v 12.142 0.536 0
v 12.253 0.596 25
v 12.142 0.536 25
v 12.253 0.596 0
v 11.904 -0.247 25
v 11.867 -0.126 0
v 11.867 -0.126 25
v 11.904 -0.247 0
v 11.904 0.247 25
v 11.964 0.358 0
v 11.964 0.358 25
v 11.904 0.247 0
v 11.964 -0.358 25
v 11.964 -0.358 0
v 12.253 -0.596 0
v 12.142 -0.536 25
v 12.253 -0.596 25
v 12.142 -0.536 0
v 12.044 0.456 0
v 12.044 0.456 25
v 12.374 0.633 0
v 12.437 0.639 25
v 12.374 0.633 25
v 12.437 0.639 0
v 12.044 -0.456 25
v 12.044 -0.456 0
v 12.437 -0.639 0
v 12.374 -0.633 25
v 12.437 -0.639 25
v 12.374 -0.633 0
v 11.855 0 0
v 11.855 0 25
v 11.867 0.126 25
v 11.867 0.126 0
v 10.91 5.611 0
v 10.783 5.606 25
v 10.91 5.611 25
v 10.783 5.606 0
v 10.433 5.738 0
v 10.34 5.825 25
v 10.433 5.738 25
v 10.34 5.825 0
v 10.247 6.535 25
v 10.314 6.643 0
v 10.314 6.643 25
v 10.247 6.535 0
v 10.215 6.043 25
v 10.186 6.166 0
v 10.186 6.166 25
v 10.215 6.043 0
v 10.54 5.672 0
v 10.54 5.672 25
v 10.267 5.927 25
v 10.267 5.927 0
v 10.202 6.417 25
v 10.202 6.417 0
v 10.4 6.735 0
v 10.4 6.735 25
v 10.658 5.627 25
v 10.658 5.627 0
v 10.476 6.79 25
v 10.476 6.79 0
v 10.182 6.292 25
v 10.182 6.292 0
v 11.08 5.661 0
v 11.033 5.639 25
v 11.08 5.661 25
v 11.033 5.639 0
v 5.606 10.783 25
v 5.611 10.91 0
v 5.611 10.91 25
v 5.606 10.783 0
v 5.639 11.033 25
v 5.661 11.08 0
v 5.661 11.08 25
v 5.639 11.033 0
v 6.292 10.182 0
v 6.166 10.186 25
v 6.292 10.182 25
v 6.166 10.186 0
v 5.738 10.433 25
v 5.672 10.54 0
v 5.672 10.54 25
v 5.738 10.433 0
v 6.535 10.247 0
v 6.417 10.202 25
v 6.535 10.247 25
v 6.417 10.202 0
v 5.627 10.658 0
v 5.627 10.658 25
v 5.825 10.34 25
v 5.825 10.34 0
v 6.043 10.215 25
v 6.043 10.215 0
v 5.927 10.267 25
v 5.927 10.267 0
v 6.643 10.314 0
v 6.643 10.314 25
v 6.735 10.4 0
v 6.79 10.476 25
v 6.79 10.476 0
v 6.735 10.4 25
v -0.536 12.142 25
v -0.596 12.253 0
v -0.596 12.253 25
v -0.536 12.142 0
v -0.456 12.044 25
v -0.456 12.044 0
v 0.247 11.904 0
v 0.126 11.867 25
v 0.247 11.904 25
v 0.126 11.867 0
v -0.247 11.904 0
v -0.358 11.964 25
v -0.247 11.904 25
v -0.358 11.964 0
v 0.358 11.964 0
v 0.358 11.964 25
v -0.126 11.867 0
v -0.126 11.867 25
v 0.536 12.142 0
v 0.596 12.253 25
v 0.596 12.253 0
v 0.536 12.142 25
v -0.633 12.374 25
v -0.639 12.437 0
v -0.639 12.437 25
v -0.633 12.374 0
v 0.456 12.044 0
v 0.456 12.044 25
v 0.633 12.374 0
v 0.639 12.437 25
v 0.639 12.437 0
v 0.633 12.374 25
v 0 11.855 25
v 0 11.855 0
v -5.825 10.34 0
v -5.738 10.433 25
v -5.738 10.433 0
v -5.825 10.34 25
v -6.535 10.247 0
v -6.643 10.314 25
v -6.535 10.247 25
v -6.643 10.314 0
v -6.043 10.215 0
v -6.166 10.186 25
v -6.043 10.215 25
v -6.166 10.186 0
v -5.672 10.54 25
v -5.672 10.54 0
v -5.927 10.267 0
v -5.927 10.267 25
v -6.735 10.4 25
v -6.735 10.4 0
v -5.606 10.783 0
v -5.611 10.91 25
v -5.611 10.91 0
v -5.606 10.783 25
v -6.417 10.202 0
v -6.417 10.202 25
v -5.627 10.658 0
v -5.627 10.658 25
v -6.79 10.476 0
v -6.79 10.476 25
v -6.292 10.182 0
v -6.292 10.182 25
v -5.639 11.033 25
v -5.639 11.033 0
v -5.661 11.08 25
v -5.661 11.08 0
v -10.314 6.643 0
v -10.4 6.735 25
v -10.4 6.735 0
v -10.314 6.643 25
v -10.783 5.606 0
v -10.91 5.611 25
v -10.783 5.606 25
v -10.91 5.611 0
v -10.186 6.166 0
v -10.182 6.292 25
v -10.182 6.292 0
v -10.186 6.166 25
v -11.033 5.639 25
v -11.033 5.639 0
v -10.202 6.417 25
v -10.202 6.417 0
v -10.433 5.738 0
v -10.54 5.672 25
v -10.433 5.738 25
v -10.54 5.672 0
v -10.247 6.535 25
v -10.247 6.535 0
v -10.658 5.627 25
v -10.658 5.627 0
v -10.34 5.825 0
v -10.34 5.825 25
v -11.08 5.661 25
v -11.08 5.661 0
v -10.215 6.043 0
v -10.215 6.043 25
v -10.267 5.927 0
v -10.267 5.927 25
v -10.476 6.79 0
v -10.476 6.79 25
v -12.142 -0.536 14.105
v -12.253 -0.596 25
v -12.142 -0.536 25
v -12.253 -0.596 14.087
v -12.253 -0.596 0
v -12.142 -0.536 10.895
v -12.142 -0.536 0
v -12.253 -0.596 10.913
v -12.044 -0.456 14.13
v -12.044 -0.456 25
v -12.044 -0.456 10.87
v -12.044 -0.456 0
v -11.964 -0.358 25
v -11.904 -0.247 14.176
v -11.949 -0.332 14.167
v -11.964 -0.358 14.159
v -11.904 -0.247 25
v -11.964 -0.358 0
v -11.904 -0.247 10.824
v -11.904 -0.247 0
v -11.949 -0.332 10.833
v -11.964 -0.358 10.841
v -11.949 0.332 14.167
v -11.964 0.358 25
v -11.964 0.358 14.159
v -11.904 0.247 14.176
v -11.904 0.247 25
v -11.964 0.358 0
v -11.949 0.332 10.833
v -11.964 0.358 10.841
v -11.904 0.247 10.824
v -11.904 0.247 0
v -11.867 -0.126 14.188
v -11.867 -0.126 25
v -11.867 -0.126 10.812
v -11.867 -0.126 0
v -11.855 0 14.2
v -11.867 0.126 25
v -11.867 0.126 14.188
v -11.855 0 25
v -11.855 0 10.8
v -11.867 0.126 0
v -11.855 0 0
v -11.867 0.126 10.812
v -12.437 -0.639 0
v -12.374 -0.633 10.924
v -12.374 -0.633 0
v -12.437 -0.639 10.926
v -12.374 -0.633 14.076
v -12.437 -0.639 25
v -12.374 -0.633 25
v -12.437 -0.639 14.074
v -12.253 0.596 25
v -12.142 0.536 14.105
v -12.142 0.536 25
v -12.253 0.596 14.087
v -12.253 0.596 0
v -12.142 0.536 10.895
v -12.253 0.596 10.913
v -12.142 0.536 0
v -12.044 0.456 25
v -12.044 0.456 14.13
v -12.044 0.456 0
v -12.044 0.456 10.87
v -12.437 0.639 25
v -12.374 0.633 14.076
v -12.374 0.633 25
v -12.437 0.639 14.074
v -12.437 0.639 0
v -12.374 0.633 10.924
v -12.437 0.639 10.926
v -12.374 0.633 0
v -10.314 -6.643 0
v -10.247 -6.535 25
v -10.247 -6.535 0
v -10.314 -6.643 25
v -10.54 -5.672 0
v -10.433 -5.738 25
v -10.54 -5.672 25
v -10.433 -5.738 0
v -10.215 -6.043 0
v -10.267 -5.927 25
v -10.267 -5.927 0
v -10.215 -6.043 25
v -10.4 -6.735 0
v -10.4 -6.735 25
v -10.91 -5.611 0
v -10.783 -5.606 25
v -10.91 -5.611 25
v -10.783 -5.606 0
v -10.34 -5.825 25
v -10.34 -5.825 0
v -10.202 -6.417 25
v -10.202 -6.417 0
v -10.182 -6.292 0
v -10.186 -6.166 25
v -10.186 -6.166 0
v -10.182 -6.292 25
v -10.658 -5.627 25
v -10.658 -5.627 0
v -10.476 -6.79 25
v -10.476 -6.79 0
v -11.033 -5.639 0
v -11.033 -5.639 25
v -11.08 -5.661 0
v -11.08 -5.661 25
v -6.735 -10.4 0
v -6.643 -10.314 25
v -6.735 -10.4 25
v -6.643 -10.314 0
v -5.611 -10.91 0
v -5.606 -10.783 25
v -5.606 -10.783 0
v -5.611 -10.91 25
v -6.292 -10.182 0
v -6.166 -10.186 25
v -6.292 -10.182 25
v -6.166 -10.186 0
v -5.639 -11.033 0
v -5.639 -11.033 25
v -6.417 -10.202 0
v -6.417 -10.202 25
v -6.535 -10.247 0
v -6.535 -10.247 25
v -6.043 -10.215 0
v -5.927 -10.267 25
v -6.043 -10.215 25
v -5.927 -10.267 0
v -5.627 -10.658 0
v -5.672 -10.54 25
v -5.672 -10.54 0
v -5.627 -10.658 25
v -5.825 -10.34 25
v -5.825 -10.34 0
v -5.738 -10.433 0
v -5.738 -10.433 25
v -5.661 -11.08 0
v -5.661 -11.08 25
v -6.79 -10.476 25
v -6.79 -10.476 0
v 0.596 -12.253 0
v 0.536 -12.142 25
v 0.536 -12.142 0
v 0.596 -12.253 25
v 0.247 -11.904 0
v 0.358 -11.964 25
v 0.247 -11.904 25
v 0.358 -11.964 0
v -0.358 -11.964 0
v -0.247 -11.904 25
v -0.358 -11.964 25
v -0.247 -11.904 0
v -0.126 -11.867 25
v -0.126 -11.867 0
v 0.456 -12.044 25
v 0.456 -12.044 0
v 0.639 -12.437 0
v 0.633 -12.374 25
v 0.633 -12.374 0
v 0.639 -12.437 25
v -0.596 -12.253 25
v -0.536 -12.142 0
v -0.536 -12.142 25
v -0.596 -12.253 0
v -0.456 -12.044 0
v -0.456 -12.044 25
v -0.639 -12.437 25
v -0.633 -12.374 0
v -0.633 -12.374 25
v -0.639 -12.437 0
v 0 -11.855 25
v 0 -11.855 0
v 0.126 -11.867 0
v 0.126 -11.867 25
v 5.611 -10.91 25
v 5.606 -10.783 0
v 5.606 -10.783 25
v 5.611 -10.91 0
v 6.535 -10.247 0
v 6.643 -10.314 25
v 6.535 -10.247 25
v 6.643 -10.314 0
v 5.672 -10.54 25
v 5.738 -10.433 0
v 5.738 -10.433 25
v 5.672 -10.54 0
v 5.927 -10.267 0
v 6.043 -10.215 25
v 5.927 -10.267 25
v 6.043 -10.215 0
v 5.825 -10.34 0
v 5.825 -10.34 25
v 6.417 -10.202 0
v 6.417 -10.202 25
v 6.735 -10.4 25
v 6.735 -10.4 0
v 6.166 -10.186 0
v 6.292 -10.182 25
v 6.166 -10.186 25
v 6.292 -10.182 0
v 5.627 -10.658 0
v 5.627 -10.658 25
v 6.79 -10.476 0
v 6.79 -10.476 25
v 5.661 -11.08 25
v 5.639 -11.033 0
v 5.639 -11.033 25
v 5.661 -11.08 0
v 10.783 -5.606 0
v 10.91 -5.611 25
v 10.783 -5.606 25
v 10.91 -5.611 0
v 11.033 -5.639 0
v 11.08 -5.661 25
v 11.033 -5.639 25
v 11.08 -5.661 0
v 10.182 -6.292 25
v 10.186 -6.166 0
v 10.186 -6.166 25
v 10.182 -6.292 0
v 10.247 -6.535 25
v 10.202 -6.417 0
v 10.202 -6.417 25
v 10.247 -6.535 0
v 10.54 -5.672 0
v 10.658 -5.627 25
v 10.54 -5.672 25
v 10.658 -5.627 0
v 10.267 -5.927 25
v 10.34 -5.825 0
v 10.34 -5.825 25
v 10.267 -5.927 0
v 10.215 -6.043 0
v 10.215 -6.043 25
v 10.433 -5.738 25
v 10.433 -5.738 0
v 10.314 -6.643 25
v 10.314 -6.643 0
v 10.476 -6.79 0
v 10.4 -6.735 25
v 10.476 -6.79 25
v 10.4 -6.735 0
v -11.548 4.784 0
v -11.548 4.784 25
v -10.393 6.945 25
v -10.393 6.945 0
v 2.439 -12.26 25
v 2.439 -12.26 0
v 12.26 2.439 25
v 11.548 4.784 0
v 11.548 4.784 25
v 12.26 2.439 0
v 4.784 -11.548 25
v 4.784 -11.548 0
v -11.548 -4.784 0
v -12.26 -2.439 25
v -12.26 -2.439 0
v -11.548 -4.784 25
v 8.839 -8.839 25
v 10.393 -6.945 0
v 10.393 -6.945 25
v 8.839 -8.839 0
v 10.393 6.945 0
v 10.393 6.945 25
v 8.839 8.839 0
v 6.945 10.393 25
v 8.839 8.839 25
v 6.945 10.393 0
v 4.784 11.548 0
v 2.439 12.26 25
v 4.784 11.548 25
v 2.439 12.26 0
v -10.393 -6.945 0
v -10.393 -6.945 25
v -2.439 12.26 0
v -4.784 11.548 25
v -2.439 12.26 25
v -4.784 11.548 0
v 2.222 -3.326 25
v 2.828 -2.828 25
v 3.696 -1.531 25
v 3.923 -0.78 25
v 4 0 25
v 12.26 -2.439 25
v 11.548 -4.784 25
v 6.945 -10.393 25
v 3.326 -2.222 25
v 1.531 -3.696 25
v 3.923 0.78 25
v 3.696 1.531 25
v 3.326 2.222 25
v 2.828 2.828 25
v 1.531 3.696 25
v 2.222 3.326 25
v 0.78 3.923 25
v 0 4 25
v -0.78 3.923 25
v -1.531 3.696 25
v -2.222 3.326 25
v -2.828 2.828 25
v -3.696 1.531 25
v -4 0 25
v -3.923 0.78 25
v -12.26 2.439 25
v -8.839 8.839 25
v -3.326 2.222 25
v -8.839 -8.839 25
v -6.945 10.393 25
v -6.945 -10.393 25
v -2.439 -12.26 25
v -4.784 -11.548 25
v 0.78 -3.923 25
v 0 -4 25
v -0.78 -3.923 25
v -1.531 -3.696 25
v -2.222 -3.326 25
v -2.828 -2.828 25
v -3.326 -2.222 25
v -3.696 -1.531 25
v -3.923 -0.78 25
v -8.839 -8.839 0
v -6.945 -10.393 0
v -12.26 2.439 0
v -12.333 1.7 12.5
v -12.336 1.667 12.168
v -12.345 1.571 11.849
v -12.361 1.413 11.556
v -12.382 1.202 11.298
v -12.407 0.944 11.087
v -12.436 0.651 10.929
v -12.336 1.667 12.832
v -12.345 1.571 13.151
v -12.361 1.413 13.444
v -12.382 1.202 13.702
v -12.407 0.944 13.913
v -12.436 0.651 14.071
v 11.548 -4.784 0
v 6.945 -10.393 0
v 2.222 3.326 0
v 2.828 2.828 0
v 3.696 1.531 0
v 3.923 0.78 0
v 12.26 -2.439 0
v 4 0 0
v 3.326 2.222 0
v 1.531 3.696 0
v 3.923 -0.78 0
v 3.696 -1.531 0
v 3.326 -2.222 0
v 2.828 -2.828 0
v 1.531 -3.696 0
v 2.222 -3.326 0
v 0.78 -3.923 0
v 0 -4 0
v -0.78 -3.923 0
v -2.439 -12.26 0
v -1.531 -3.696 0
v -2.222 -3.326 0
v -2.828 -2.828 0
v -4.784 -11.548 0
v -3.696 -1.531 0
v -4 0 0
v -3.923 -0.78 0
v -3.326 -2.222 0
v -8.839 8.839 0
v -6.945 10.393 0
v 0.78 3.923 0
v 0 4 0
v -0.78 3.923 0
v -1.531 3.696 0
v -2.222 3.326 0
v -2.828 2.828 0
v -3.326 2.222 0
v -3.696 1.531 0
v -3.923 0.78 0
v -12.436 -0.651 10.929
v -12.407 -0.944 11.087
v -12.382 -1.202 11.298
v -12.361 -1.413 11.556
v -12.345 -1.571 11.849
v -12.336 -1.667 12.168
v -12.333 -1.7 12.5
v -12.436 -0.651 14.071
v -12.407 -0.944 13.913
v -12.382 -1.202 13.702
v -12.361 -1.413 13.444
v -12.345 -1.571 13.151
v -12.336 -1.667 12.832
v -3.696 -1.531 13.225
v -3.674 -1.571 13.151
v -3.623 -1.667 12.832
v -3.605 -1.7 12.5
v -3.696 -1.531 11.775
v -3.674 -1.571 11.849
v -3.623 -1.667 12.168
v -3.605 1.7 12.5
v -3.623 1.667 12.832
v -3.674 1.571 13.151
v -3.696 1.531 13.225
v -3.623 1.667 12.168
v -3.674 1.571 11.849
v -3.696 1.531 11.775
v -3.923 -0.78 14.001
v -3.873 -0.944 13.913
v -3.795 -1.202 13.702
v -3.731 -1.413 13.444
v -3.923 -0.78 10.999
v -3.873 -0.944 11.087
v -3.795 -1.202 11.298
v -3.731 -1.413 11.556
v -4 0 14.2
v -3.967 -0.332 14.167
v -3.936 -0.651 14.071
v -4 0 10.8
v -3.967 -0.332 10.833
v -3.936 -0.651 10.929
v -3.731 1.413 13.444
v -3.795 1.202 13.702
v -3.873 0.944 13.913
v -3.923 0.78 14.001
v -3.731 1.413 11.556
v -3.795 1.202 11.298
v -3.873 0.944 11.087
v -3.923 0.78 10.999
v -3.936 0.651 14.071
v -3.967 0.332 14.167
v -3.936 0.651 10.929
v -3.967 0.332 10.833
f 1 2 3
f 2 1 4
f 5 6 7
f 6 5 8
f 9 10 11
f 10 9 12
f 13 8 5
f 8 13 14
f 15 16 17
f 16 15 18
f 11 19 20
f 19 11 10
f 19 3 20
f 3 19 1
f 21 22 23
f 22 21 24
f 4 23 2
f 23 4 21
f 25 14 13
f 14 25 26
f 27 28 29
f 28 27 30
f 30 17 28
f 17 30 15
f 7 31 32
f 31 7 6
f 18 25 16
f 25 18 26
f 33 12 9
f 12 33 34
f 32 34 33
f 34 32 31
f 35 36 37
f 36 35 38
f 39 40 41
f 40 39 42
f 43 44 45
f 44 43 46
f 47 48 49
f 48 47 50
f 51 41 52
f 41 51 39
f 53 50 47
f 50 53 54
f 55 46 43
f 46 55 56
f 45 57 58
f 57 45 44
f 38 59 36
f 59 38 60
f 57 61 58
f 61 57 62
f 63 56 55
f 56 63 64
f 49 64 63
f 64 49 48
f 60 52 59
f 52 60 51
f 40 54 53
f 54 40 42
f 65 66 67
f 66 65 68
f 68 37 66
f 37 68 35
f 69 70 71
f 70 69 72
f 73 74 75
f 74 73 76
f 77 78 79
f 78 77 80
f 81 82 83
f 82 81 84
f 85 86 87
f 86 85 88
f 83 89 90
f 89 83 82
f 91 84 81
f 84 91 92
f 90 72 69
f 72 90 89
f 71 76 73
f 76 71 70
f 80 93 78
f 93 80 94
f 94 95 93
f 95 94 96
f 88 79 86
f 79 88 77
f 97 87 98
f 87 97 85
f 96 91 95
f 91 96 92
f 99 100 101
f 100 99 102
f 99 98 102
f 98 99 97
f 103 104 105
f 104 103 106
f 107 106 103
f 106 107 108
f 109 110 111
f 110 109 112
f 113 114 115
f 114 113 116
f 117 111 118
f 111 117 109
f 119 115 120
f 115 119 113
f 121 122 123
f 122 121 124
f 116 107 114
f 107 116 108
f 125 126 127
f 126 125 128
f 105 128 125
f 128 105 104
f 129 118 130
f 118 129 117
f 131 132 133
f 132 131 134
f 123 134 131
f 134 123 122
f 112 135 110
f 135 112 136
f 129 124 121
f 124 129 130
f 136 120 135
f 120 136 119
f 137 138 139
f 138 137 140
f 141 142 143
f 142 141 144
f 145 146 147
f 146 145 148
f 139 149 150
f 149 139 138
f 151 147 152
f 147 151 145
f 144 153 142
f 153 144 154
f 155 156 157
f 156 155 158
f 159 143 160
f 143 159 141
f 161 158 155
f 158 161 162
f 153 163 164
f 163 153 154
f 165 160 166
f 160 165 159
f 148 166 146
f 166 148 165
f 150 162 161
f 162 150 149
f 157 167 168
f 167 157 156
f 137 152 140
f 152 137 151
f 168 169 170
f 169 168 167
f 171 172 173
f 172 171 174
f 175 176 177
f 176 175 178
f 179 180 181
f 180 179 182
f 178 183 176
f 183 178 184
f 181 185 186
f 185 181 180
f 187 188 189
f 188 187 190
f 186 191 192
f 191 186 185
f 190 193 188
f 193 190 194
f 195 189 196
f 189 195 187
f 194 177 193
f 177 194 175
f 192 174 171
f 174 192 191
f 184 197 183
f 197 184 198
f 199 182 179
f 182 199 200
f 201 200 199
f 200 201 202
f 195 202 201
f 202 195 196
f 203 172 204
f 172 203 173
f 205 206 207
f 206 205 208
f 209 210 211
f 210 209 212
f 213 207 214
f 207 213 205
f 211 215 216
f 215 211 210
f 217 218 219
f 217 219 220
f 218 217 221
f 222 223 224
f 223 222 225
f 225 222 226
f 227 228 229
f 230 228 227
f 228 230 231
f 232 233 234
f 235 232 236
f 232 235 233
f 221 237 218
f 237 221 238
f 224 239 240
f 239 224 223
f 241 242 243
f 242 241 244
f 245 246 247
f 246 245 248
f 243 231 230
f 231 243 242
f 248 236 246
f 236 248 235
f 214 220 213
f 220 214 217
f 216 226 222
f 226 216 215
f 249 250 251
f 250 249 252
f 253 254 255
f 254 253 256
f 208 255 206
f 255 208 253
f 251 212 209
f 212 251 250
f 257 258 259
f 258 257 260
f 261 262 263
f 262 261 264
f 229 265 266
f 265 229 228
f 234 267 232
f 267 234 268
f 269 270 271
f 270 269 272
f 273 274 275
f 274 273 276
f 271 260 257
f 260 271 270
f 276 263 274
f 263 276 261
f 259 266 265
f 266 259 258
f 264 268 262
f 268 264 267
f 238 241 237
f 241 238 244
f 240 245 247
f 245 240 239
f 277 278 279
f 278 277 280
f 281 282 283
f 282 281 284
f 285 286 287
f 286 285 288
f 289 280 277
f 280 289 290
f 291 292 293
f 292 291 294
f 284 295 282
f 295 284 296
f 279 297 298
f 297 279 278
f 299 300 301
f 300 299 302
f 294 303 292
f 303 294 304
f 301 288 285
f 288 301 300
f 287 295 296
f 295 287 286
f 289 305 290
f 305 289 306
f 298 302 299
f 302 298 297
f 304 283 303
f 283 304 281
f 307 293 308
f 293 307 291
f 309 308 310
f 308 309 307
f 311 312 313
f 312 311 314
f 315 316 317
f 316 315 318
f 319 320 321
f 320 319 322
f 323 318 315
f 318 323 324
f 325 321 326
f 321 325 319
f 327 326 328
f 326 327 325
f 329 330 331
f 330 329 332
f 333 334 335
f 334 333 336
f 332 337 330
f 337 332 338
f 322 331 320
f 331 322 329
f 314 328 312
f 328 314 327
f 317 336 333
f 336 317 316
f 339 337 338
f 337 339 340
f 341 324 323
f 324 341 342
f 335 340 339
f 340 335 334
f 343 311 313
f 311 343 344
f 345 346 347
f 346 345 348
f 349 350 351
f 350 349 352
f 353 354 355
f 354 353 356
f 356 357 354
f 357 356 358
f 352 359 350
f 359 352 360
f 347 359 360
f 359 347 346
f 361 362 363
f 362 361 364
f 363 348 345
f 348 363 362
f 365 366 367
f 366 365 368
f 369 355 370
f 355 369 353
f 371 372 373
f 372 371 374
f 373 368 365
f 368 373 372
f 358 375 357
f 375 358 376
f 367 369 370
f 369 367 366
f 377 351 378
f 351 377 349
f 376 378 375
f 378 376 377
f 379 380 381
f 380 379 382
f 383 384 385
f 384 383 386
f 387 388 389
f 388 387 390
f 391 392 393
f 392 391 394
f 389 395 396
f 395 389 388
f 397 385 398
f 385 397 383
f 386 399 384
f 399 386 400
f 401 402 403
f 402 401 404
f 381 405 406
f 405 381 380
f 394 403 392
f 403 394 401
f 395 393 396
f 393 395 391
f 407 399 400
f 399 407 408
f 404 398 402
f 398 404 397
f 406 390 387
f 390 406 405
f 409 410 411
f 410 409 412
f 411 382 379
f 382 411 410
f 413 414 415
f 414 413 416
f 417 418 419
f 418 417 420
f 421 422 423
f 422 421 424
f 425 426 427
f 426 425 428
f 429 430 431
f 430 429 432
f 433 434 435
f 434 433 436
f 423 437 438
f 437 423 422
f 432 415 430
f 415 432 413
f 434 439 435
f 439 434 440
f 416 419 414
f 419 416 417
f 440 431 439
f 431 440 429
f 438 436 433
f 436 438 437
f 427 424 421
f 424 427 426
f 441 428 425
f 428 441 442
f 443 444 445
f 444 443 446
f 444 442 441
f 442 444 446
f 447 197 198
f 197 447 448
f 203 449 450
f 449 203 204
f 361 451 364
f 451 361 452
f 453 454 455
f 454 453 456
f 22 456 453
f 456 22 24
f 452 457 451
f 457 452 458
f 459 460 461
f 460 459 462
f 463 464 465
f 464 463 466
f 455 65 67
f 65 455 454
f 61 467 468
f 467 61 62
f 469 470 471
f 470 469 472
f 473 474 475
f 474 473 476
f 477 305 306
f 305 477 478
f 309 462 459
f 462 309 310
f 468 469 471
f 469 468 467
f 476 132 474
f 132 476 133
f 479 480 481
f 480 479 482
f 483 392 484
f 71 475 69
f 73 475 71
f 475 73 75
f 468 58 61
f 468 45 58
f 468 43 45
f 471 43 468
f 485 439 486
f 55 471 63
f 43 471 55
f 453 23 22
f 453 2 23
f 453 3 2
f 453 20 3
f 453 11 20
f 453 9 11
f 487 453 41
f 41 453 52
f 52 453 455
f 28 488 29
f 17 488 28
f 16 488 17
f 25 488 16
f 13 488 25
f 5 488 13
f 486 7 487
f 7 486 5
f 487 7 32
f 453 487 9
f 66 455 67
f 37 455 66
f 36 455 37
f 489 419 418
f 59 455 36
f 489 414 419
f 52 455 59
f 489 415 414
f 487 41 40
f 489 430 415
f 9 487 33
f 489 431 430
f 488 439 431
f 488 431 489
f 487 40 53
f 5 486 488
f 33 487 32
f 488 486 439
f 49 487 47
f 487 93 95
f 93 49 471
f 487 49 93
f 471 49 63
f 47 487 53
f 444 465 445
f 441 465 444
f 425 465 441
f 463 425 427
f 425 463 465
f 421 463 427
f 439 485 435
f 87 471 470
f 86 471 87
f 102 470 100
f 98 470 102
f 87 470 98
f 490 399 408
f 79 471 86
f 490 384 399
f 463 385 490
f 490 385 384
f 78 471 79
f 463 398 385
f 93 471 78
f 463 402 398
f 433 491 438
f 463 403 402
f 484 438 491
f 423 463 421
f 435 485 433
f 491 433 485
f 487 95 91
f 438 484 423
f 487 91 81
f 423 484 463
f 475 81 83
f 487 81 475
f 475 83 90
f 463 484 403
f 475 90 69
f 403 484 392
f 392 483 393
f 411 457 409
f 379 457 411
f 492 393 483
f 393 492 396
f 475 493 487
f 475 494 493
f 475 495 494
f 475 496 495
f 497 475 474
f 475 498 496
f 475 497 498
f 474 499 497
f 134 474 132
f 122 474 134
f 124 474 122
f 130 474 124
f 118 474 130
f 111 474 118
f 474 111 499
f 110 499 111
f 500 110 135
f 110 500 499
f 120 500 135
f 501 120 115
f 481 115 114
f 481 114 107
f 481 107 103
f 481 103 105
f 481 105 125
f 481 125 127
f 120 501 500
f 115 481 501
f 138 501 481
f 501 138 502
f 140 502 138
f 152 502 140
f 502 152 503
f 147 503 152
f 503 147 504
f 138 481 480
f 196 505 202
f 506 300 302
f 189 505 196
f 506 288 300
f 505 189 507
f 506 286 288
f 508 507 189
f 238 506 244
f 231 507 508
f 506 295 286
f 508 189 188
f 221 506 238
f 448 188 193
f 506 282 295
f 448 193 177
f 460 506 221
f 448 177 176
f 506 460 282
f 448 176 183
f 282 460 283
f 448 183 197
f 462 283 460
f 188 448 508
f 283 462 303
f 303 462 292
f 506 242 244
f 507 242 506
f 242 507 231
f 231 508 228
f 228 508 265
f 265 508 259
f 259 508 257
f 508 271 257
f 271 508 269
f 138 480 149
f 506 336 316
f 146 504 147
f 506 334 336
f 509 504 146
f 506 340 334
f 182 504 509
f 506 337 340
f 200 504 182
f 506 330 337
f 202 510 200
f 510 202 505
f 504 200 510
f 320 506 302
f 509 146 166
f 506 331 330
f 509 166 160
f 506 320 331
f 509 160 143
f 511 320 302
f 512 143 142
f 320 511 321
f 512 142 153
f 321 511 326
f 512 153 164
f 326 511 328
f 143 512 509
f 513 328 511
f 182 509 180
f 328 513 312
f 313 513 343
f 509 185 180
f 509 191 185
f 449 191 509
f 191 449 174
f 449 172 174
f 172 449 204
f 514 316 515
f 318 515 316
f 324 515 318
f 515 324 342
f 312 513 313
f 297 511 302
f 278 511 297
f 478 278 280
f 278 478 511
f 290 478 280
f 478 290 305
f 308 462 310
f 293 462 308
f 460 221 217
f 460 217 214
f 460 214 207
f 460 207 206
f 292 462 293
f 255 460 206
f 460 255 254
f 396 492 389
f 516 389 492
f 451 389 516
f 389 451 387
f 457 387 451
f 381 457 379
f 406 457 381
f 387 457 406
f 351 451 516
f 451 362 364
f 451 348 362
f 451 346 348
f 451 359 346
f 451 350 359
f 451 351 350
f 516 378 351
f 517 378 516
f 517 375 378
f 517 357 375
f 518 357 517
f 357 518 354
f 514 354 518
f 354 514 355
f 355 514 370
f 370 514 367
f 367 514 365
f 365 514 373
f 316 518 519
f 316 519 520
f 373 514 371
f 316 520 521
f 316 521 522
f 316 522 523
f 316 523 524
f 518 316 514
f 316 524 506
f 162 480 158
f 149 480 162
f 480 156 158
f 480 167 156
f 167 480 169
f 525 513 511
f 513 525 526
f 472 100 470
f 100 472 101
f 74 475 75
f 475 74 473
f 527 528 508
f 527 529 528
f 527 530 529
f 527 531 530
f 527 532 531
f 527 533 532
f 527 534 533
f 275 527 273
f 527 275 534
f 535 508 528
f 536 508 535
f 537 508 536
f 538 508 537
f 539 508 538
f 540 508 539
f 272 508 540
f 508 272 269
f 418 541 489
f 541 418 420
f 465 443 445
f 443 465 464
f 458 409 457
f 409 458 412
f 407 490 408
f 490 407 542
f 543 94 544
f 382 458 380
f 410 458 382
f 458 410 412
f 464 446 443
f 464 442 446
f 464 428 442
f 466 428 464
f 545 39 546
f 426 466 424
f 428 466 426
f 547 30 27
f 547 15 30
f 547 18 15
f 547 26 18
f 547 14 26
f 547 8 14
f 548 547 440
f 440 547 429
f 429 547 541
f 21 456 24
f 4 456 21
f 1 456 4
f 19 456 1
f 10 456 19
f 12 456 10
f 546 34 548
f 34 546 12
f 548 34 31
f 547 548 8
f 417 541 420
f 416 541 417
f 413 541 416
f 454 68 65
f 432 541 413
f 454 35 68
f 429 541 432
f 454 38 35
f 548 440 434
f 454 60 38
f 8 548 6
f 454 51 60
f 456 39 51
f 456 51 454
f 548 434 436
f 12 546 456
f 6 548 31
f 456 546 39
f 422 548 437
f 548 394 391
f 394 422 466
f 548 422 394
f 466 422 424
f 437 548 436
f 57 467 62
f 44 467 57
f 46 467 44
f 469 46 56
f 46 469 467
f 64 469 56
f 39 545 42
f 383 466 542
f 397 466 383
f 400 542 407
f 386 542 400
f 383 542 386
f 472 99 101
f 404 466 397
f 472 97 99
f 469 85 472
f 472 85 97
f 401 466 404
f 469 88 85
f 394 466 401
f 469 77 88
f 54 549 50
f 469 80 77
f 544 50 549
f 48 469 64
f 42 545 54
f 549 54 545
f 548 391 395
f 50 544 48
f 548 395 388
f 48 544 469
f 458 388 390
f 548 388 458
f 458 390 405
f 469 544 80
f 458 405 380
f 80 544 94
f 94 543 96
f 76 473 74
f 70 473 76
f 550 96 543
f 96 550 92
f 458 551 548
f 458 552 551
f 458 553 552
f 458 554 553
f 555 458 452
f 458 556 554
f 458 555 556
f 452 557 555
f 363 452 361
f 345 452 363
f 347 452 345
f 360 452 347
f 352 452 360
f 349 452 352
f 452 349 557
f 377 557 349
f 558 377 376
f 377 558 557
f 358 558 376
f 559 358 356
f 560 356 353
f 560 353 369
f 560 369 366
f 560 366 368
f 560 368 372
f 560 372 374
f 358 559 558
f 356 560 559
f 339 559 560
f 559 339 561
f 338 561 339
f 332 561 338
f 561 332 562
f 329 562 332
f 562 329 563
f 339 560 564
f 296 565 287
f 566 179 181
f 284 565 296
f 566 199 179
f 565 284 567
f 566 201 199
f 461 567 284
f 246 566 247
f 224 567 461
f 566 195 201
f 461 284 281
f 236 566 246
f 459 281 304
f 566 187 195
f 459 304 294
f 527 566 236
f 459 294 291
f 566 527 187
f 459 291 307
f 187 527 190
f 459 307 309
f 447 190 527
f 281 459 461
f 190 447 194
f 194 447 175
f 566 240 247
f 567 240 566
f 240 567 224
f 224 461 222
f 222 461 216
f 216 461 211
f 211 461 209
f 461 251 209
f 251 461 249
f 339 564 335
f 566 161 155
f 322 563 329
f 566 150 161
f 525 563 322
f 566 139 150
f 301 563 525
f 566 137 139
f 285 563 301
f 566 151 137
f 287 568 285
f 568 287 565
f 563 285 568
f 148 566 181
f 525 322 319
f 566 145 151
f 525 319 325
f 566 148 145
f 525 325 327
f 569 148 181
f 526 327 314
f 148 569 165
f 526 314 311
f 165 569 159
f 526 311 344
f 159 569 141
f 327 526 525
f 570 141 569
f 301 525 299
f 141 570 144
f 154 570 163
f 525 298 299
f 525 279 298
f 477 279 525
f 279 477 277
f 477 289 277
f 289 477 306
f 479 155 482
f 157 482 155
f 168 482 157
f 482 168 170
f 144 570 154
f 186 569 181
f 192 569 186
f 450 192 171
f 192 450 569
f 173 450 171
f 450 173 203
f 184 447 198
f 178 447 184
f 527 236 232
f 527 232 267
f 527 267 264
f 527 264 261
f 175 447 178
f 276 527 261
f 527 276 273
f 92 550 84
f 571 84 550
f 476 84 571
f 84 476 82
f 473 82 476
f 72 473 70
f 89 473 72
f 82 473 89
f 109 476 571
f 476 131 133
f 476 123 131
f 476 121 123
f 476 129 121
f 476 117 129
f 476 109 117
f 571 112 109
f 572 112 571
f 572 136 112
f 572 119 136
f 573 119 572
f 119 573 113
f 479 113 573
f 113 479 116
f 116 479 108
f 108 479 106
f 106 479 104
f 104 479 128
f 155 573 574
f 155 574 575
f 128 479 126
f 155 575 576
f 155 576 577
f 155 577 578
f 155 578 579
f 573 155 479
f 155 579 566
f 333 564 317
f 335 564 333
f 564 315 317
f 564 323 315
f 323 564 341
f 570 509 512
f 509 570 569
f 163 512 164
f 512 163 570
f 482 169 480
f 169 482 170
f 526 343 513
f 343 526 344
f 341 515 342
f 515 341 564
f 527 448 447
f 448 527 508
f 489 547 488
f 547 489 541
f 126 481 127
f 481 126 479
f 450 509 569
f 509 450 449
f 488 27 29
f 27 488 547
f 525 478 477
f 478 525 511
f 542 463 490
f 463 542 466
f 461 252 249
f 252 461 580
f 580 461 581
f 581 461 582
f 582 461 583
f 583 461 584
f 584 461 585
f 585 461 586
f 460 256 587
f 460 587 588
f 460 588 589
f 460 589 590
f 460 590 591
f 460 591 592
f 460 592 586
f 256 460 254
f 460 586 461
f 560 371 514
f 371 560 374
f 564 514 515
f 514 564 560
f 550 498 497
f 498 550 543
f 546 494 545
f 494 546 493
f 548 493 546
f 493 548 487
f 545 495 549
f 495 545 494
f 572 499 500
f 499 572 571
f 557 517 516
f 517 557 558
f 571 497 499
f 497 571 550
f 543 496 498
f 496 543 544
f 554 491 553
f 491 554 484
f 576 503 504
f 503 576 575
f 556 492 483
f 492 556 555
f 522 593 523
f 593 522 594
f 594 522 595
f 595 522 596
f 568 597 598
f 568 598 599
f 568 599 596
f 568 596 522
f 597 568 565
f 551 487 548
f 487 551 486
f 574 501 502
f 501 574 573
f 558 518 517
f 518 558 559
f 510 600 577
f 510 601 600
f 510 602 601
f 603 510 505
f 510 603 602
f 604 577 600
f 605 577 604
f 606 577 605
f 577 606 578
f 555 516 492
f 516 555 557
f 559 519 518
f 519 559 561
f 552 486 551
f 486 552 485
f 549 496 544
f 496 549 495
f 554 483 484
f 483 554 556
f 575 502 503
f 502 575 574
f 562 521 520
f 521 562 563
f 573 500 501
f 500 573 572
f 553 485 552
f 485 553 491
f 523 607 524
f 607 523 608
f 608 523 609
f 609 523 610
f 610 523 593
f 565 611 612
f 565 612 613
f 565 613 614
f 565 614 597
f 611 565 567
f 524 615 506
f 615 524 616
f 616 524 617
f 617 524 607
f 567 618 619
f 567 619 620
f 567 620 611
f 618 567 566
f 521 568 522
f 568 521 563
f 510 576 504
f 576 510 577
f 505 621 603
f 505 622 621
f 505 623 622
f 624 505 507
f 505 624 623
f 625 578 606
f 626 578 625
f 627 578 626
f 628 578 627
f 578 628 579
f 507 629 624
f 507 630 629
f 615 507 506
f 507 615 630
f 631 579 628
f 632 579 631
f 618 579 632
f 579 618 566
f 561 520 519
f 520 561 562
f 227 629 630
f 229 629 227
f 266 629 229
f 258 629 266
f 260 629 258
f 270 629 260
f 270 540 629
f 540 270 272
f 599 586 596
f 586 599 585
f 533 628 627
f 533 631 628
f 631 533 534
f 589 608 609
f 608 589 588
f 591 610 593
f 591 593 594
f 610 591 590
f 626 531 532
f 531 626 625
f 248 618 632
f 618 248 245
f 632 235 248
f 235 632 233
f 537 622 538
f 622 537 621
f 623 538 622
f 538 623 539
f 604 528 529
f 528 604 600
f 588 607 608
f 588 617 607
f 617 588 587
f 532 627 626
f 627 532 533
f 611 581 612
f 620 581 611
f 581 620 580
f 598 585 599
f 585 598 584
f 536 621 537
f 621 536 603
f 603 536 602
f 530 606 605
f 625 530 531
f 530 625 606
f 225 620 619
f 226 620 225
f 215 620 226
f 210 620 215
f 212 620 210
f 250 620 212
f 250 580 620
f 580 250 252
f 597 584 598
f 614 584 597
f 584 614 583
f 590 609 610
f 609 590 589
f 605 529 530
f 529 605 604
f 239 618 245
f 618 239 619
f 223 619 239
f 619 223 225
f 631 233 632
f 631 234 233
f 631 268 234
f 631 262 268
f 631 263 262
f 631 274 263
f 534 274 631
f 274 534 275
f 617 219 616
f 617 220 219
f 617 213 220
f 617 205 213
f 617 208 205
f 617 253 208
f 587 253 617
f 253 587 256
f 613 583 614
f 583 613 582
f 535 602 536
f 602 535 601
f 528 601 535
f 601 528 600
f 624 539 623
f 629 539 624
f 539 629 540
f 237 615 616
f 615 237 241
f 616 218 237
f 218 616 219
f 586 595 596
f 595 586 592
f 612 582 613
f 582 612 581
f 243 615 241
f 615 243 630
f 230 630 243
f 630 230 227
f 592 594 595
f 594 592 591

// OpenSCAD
$fn = 32;

// ----------------------------------------------------------------------
// Hand knob: 25 x 25 x 25 mm
// ----------------------------------------------------------------------

// --- parameters (mm) ---
head_d = 25;              // knob diameter
head_h = 25;              // knob height
hole_d = 8;               // shaft bore
set_d = 3.4;              // set screw tap hole
notch_d = 1.29;           // knurl groove diameter
knurl_n = 12;             // number of knurl grooves

module body() {
  cylinder(h = head_h, d = head_d);
}

difference() {
  union() {
    body();
  }
  translate([0, 0, -1]) cylinder(h = head_h + 0 + 2, d = hole_d);
  /* knurl grooves */
  for (i = [0 : knurl_n - 1])
    rotate([0, 0, i * 360 / knurl_n])
      translate([head_d / 2, 0, -0.5])
        cylinder(h = head_h + 1, d = notch_d);
  translate([-head_d / 2 - 1, 0, head_h * 0.5]) rotate([0, 90, 0]) cylinder(h = head_d / 2 + 2, d = set_d);
}
